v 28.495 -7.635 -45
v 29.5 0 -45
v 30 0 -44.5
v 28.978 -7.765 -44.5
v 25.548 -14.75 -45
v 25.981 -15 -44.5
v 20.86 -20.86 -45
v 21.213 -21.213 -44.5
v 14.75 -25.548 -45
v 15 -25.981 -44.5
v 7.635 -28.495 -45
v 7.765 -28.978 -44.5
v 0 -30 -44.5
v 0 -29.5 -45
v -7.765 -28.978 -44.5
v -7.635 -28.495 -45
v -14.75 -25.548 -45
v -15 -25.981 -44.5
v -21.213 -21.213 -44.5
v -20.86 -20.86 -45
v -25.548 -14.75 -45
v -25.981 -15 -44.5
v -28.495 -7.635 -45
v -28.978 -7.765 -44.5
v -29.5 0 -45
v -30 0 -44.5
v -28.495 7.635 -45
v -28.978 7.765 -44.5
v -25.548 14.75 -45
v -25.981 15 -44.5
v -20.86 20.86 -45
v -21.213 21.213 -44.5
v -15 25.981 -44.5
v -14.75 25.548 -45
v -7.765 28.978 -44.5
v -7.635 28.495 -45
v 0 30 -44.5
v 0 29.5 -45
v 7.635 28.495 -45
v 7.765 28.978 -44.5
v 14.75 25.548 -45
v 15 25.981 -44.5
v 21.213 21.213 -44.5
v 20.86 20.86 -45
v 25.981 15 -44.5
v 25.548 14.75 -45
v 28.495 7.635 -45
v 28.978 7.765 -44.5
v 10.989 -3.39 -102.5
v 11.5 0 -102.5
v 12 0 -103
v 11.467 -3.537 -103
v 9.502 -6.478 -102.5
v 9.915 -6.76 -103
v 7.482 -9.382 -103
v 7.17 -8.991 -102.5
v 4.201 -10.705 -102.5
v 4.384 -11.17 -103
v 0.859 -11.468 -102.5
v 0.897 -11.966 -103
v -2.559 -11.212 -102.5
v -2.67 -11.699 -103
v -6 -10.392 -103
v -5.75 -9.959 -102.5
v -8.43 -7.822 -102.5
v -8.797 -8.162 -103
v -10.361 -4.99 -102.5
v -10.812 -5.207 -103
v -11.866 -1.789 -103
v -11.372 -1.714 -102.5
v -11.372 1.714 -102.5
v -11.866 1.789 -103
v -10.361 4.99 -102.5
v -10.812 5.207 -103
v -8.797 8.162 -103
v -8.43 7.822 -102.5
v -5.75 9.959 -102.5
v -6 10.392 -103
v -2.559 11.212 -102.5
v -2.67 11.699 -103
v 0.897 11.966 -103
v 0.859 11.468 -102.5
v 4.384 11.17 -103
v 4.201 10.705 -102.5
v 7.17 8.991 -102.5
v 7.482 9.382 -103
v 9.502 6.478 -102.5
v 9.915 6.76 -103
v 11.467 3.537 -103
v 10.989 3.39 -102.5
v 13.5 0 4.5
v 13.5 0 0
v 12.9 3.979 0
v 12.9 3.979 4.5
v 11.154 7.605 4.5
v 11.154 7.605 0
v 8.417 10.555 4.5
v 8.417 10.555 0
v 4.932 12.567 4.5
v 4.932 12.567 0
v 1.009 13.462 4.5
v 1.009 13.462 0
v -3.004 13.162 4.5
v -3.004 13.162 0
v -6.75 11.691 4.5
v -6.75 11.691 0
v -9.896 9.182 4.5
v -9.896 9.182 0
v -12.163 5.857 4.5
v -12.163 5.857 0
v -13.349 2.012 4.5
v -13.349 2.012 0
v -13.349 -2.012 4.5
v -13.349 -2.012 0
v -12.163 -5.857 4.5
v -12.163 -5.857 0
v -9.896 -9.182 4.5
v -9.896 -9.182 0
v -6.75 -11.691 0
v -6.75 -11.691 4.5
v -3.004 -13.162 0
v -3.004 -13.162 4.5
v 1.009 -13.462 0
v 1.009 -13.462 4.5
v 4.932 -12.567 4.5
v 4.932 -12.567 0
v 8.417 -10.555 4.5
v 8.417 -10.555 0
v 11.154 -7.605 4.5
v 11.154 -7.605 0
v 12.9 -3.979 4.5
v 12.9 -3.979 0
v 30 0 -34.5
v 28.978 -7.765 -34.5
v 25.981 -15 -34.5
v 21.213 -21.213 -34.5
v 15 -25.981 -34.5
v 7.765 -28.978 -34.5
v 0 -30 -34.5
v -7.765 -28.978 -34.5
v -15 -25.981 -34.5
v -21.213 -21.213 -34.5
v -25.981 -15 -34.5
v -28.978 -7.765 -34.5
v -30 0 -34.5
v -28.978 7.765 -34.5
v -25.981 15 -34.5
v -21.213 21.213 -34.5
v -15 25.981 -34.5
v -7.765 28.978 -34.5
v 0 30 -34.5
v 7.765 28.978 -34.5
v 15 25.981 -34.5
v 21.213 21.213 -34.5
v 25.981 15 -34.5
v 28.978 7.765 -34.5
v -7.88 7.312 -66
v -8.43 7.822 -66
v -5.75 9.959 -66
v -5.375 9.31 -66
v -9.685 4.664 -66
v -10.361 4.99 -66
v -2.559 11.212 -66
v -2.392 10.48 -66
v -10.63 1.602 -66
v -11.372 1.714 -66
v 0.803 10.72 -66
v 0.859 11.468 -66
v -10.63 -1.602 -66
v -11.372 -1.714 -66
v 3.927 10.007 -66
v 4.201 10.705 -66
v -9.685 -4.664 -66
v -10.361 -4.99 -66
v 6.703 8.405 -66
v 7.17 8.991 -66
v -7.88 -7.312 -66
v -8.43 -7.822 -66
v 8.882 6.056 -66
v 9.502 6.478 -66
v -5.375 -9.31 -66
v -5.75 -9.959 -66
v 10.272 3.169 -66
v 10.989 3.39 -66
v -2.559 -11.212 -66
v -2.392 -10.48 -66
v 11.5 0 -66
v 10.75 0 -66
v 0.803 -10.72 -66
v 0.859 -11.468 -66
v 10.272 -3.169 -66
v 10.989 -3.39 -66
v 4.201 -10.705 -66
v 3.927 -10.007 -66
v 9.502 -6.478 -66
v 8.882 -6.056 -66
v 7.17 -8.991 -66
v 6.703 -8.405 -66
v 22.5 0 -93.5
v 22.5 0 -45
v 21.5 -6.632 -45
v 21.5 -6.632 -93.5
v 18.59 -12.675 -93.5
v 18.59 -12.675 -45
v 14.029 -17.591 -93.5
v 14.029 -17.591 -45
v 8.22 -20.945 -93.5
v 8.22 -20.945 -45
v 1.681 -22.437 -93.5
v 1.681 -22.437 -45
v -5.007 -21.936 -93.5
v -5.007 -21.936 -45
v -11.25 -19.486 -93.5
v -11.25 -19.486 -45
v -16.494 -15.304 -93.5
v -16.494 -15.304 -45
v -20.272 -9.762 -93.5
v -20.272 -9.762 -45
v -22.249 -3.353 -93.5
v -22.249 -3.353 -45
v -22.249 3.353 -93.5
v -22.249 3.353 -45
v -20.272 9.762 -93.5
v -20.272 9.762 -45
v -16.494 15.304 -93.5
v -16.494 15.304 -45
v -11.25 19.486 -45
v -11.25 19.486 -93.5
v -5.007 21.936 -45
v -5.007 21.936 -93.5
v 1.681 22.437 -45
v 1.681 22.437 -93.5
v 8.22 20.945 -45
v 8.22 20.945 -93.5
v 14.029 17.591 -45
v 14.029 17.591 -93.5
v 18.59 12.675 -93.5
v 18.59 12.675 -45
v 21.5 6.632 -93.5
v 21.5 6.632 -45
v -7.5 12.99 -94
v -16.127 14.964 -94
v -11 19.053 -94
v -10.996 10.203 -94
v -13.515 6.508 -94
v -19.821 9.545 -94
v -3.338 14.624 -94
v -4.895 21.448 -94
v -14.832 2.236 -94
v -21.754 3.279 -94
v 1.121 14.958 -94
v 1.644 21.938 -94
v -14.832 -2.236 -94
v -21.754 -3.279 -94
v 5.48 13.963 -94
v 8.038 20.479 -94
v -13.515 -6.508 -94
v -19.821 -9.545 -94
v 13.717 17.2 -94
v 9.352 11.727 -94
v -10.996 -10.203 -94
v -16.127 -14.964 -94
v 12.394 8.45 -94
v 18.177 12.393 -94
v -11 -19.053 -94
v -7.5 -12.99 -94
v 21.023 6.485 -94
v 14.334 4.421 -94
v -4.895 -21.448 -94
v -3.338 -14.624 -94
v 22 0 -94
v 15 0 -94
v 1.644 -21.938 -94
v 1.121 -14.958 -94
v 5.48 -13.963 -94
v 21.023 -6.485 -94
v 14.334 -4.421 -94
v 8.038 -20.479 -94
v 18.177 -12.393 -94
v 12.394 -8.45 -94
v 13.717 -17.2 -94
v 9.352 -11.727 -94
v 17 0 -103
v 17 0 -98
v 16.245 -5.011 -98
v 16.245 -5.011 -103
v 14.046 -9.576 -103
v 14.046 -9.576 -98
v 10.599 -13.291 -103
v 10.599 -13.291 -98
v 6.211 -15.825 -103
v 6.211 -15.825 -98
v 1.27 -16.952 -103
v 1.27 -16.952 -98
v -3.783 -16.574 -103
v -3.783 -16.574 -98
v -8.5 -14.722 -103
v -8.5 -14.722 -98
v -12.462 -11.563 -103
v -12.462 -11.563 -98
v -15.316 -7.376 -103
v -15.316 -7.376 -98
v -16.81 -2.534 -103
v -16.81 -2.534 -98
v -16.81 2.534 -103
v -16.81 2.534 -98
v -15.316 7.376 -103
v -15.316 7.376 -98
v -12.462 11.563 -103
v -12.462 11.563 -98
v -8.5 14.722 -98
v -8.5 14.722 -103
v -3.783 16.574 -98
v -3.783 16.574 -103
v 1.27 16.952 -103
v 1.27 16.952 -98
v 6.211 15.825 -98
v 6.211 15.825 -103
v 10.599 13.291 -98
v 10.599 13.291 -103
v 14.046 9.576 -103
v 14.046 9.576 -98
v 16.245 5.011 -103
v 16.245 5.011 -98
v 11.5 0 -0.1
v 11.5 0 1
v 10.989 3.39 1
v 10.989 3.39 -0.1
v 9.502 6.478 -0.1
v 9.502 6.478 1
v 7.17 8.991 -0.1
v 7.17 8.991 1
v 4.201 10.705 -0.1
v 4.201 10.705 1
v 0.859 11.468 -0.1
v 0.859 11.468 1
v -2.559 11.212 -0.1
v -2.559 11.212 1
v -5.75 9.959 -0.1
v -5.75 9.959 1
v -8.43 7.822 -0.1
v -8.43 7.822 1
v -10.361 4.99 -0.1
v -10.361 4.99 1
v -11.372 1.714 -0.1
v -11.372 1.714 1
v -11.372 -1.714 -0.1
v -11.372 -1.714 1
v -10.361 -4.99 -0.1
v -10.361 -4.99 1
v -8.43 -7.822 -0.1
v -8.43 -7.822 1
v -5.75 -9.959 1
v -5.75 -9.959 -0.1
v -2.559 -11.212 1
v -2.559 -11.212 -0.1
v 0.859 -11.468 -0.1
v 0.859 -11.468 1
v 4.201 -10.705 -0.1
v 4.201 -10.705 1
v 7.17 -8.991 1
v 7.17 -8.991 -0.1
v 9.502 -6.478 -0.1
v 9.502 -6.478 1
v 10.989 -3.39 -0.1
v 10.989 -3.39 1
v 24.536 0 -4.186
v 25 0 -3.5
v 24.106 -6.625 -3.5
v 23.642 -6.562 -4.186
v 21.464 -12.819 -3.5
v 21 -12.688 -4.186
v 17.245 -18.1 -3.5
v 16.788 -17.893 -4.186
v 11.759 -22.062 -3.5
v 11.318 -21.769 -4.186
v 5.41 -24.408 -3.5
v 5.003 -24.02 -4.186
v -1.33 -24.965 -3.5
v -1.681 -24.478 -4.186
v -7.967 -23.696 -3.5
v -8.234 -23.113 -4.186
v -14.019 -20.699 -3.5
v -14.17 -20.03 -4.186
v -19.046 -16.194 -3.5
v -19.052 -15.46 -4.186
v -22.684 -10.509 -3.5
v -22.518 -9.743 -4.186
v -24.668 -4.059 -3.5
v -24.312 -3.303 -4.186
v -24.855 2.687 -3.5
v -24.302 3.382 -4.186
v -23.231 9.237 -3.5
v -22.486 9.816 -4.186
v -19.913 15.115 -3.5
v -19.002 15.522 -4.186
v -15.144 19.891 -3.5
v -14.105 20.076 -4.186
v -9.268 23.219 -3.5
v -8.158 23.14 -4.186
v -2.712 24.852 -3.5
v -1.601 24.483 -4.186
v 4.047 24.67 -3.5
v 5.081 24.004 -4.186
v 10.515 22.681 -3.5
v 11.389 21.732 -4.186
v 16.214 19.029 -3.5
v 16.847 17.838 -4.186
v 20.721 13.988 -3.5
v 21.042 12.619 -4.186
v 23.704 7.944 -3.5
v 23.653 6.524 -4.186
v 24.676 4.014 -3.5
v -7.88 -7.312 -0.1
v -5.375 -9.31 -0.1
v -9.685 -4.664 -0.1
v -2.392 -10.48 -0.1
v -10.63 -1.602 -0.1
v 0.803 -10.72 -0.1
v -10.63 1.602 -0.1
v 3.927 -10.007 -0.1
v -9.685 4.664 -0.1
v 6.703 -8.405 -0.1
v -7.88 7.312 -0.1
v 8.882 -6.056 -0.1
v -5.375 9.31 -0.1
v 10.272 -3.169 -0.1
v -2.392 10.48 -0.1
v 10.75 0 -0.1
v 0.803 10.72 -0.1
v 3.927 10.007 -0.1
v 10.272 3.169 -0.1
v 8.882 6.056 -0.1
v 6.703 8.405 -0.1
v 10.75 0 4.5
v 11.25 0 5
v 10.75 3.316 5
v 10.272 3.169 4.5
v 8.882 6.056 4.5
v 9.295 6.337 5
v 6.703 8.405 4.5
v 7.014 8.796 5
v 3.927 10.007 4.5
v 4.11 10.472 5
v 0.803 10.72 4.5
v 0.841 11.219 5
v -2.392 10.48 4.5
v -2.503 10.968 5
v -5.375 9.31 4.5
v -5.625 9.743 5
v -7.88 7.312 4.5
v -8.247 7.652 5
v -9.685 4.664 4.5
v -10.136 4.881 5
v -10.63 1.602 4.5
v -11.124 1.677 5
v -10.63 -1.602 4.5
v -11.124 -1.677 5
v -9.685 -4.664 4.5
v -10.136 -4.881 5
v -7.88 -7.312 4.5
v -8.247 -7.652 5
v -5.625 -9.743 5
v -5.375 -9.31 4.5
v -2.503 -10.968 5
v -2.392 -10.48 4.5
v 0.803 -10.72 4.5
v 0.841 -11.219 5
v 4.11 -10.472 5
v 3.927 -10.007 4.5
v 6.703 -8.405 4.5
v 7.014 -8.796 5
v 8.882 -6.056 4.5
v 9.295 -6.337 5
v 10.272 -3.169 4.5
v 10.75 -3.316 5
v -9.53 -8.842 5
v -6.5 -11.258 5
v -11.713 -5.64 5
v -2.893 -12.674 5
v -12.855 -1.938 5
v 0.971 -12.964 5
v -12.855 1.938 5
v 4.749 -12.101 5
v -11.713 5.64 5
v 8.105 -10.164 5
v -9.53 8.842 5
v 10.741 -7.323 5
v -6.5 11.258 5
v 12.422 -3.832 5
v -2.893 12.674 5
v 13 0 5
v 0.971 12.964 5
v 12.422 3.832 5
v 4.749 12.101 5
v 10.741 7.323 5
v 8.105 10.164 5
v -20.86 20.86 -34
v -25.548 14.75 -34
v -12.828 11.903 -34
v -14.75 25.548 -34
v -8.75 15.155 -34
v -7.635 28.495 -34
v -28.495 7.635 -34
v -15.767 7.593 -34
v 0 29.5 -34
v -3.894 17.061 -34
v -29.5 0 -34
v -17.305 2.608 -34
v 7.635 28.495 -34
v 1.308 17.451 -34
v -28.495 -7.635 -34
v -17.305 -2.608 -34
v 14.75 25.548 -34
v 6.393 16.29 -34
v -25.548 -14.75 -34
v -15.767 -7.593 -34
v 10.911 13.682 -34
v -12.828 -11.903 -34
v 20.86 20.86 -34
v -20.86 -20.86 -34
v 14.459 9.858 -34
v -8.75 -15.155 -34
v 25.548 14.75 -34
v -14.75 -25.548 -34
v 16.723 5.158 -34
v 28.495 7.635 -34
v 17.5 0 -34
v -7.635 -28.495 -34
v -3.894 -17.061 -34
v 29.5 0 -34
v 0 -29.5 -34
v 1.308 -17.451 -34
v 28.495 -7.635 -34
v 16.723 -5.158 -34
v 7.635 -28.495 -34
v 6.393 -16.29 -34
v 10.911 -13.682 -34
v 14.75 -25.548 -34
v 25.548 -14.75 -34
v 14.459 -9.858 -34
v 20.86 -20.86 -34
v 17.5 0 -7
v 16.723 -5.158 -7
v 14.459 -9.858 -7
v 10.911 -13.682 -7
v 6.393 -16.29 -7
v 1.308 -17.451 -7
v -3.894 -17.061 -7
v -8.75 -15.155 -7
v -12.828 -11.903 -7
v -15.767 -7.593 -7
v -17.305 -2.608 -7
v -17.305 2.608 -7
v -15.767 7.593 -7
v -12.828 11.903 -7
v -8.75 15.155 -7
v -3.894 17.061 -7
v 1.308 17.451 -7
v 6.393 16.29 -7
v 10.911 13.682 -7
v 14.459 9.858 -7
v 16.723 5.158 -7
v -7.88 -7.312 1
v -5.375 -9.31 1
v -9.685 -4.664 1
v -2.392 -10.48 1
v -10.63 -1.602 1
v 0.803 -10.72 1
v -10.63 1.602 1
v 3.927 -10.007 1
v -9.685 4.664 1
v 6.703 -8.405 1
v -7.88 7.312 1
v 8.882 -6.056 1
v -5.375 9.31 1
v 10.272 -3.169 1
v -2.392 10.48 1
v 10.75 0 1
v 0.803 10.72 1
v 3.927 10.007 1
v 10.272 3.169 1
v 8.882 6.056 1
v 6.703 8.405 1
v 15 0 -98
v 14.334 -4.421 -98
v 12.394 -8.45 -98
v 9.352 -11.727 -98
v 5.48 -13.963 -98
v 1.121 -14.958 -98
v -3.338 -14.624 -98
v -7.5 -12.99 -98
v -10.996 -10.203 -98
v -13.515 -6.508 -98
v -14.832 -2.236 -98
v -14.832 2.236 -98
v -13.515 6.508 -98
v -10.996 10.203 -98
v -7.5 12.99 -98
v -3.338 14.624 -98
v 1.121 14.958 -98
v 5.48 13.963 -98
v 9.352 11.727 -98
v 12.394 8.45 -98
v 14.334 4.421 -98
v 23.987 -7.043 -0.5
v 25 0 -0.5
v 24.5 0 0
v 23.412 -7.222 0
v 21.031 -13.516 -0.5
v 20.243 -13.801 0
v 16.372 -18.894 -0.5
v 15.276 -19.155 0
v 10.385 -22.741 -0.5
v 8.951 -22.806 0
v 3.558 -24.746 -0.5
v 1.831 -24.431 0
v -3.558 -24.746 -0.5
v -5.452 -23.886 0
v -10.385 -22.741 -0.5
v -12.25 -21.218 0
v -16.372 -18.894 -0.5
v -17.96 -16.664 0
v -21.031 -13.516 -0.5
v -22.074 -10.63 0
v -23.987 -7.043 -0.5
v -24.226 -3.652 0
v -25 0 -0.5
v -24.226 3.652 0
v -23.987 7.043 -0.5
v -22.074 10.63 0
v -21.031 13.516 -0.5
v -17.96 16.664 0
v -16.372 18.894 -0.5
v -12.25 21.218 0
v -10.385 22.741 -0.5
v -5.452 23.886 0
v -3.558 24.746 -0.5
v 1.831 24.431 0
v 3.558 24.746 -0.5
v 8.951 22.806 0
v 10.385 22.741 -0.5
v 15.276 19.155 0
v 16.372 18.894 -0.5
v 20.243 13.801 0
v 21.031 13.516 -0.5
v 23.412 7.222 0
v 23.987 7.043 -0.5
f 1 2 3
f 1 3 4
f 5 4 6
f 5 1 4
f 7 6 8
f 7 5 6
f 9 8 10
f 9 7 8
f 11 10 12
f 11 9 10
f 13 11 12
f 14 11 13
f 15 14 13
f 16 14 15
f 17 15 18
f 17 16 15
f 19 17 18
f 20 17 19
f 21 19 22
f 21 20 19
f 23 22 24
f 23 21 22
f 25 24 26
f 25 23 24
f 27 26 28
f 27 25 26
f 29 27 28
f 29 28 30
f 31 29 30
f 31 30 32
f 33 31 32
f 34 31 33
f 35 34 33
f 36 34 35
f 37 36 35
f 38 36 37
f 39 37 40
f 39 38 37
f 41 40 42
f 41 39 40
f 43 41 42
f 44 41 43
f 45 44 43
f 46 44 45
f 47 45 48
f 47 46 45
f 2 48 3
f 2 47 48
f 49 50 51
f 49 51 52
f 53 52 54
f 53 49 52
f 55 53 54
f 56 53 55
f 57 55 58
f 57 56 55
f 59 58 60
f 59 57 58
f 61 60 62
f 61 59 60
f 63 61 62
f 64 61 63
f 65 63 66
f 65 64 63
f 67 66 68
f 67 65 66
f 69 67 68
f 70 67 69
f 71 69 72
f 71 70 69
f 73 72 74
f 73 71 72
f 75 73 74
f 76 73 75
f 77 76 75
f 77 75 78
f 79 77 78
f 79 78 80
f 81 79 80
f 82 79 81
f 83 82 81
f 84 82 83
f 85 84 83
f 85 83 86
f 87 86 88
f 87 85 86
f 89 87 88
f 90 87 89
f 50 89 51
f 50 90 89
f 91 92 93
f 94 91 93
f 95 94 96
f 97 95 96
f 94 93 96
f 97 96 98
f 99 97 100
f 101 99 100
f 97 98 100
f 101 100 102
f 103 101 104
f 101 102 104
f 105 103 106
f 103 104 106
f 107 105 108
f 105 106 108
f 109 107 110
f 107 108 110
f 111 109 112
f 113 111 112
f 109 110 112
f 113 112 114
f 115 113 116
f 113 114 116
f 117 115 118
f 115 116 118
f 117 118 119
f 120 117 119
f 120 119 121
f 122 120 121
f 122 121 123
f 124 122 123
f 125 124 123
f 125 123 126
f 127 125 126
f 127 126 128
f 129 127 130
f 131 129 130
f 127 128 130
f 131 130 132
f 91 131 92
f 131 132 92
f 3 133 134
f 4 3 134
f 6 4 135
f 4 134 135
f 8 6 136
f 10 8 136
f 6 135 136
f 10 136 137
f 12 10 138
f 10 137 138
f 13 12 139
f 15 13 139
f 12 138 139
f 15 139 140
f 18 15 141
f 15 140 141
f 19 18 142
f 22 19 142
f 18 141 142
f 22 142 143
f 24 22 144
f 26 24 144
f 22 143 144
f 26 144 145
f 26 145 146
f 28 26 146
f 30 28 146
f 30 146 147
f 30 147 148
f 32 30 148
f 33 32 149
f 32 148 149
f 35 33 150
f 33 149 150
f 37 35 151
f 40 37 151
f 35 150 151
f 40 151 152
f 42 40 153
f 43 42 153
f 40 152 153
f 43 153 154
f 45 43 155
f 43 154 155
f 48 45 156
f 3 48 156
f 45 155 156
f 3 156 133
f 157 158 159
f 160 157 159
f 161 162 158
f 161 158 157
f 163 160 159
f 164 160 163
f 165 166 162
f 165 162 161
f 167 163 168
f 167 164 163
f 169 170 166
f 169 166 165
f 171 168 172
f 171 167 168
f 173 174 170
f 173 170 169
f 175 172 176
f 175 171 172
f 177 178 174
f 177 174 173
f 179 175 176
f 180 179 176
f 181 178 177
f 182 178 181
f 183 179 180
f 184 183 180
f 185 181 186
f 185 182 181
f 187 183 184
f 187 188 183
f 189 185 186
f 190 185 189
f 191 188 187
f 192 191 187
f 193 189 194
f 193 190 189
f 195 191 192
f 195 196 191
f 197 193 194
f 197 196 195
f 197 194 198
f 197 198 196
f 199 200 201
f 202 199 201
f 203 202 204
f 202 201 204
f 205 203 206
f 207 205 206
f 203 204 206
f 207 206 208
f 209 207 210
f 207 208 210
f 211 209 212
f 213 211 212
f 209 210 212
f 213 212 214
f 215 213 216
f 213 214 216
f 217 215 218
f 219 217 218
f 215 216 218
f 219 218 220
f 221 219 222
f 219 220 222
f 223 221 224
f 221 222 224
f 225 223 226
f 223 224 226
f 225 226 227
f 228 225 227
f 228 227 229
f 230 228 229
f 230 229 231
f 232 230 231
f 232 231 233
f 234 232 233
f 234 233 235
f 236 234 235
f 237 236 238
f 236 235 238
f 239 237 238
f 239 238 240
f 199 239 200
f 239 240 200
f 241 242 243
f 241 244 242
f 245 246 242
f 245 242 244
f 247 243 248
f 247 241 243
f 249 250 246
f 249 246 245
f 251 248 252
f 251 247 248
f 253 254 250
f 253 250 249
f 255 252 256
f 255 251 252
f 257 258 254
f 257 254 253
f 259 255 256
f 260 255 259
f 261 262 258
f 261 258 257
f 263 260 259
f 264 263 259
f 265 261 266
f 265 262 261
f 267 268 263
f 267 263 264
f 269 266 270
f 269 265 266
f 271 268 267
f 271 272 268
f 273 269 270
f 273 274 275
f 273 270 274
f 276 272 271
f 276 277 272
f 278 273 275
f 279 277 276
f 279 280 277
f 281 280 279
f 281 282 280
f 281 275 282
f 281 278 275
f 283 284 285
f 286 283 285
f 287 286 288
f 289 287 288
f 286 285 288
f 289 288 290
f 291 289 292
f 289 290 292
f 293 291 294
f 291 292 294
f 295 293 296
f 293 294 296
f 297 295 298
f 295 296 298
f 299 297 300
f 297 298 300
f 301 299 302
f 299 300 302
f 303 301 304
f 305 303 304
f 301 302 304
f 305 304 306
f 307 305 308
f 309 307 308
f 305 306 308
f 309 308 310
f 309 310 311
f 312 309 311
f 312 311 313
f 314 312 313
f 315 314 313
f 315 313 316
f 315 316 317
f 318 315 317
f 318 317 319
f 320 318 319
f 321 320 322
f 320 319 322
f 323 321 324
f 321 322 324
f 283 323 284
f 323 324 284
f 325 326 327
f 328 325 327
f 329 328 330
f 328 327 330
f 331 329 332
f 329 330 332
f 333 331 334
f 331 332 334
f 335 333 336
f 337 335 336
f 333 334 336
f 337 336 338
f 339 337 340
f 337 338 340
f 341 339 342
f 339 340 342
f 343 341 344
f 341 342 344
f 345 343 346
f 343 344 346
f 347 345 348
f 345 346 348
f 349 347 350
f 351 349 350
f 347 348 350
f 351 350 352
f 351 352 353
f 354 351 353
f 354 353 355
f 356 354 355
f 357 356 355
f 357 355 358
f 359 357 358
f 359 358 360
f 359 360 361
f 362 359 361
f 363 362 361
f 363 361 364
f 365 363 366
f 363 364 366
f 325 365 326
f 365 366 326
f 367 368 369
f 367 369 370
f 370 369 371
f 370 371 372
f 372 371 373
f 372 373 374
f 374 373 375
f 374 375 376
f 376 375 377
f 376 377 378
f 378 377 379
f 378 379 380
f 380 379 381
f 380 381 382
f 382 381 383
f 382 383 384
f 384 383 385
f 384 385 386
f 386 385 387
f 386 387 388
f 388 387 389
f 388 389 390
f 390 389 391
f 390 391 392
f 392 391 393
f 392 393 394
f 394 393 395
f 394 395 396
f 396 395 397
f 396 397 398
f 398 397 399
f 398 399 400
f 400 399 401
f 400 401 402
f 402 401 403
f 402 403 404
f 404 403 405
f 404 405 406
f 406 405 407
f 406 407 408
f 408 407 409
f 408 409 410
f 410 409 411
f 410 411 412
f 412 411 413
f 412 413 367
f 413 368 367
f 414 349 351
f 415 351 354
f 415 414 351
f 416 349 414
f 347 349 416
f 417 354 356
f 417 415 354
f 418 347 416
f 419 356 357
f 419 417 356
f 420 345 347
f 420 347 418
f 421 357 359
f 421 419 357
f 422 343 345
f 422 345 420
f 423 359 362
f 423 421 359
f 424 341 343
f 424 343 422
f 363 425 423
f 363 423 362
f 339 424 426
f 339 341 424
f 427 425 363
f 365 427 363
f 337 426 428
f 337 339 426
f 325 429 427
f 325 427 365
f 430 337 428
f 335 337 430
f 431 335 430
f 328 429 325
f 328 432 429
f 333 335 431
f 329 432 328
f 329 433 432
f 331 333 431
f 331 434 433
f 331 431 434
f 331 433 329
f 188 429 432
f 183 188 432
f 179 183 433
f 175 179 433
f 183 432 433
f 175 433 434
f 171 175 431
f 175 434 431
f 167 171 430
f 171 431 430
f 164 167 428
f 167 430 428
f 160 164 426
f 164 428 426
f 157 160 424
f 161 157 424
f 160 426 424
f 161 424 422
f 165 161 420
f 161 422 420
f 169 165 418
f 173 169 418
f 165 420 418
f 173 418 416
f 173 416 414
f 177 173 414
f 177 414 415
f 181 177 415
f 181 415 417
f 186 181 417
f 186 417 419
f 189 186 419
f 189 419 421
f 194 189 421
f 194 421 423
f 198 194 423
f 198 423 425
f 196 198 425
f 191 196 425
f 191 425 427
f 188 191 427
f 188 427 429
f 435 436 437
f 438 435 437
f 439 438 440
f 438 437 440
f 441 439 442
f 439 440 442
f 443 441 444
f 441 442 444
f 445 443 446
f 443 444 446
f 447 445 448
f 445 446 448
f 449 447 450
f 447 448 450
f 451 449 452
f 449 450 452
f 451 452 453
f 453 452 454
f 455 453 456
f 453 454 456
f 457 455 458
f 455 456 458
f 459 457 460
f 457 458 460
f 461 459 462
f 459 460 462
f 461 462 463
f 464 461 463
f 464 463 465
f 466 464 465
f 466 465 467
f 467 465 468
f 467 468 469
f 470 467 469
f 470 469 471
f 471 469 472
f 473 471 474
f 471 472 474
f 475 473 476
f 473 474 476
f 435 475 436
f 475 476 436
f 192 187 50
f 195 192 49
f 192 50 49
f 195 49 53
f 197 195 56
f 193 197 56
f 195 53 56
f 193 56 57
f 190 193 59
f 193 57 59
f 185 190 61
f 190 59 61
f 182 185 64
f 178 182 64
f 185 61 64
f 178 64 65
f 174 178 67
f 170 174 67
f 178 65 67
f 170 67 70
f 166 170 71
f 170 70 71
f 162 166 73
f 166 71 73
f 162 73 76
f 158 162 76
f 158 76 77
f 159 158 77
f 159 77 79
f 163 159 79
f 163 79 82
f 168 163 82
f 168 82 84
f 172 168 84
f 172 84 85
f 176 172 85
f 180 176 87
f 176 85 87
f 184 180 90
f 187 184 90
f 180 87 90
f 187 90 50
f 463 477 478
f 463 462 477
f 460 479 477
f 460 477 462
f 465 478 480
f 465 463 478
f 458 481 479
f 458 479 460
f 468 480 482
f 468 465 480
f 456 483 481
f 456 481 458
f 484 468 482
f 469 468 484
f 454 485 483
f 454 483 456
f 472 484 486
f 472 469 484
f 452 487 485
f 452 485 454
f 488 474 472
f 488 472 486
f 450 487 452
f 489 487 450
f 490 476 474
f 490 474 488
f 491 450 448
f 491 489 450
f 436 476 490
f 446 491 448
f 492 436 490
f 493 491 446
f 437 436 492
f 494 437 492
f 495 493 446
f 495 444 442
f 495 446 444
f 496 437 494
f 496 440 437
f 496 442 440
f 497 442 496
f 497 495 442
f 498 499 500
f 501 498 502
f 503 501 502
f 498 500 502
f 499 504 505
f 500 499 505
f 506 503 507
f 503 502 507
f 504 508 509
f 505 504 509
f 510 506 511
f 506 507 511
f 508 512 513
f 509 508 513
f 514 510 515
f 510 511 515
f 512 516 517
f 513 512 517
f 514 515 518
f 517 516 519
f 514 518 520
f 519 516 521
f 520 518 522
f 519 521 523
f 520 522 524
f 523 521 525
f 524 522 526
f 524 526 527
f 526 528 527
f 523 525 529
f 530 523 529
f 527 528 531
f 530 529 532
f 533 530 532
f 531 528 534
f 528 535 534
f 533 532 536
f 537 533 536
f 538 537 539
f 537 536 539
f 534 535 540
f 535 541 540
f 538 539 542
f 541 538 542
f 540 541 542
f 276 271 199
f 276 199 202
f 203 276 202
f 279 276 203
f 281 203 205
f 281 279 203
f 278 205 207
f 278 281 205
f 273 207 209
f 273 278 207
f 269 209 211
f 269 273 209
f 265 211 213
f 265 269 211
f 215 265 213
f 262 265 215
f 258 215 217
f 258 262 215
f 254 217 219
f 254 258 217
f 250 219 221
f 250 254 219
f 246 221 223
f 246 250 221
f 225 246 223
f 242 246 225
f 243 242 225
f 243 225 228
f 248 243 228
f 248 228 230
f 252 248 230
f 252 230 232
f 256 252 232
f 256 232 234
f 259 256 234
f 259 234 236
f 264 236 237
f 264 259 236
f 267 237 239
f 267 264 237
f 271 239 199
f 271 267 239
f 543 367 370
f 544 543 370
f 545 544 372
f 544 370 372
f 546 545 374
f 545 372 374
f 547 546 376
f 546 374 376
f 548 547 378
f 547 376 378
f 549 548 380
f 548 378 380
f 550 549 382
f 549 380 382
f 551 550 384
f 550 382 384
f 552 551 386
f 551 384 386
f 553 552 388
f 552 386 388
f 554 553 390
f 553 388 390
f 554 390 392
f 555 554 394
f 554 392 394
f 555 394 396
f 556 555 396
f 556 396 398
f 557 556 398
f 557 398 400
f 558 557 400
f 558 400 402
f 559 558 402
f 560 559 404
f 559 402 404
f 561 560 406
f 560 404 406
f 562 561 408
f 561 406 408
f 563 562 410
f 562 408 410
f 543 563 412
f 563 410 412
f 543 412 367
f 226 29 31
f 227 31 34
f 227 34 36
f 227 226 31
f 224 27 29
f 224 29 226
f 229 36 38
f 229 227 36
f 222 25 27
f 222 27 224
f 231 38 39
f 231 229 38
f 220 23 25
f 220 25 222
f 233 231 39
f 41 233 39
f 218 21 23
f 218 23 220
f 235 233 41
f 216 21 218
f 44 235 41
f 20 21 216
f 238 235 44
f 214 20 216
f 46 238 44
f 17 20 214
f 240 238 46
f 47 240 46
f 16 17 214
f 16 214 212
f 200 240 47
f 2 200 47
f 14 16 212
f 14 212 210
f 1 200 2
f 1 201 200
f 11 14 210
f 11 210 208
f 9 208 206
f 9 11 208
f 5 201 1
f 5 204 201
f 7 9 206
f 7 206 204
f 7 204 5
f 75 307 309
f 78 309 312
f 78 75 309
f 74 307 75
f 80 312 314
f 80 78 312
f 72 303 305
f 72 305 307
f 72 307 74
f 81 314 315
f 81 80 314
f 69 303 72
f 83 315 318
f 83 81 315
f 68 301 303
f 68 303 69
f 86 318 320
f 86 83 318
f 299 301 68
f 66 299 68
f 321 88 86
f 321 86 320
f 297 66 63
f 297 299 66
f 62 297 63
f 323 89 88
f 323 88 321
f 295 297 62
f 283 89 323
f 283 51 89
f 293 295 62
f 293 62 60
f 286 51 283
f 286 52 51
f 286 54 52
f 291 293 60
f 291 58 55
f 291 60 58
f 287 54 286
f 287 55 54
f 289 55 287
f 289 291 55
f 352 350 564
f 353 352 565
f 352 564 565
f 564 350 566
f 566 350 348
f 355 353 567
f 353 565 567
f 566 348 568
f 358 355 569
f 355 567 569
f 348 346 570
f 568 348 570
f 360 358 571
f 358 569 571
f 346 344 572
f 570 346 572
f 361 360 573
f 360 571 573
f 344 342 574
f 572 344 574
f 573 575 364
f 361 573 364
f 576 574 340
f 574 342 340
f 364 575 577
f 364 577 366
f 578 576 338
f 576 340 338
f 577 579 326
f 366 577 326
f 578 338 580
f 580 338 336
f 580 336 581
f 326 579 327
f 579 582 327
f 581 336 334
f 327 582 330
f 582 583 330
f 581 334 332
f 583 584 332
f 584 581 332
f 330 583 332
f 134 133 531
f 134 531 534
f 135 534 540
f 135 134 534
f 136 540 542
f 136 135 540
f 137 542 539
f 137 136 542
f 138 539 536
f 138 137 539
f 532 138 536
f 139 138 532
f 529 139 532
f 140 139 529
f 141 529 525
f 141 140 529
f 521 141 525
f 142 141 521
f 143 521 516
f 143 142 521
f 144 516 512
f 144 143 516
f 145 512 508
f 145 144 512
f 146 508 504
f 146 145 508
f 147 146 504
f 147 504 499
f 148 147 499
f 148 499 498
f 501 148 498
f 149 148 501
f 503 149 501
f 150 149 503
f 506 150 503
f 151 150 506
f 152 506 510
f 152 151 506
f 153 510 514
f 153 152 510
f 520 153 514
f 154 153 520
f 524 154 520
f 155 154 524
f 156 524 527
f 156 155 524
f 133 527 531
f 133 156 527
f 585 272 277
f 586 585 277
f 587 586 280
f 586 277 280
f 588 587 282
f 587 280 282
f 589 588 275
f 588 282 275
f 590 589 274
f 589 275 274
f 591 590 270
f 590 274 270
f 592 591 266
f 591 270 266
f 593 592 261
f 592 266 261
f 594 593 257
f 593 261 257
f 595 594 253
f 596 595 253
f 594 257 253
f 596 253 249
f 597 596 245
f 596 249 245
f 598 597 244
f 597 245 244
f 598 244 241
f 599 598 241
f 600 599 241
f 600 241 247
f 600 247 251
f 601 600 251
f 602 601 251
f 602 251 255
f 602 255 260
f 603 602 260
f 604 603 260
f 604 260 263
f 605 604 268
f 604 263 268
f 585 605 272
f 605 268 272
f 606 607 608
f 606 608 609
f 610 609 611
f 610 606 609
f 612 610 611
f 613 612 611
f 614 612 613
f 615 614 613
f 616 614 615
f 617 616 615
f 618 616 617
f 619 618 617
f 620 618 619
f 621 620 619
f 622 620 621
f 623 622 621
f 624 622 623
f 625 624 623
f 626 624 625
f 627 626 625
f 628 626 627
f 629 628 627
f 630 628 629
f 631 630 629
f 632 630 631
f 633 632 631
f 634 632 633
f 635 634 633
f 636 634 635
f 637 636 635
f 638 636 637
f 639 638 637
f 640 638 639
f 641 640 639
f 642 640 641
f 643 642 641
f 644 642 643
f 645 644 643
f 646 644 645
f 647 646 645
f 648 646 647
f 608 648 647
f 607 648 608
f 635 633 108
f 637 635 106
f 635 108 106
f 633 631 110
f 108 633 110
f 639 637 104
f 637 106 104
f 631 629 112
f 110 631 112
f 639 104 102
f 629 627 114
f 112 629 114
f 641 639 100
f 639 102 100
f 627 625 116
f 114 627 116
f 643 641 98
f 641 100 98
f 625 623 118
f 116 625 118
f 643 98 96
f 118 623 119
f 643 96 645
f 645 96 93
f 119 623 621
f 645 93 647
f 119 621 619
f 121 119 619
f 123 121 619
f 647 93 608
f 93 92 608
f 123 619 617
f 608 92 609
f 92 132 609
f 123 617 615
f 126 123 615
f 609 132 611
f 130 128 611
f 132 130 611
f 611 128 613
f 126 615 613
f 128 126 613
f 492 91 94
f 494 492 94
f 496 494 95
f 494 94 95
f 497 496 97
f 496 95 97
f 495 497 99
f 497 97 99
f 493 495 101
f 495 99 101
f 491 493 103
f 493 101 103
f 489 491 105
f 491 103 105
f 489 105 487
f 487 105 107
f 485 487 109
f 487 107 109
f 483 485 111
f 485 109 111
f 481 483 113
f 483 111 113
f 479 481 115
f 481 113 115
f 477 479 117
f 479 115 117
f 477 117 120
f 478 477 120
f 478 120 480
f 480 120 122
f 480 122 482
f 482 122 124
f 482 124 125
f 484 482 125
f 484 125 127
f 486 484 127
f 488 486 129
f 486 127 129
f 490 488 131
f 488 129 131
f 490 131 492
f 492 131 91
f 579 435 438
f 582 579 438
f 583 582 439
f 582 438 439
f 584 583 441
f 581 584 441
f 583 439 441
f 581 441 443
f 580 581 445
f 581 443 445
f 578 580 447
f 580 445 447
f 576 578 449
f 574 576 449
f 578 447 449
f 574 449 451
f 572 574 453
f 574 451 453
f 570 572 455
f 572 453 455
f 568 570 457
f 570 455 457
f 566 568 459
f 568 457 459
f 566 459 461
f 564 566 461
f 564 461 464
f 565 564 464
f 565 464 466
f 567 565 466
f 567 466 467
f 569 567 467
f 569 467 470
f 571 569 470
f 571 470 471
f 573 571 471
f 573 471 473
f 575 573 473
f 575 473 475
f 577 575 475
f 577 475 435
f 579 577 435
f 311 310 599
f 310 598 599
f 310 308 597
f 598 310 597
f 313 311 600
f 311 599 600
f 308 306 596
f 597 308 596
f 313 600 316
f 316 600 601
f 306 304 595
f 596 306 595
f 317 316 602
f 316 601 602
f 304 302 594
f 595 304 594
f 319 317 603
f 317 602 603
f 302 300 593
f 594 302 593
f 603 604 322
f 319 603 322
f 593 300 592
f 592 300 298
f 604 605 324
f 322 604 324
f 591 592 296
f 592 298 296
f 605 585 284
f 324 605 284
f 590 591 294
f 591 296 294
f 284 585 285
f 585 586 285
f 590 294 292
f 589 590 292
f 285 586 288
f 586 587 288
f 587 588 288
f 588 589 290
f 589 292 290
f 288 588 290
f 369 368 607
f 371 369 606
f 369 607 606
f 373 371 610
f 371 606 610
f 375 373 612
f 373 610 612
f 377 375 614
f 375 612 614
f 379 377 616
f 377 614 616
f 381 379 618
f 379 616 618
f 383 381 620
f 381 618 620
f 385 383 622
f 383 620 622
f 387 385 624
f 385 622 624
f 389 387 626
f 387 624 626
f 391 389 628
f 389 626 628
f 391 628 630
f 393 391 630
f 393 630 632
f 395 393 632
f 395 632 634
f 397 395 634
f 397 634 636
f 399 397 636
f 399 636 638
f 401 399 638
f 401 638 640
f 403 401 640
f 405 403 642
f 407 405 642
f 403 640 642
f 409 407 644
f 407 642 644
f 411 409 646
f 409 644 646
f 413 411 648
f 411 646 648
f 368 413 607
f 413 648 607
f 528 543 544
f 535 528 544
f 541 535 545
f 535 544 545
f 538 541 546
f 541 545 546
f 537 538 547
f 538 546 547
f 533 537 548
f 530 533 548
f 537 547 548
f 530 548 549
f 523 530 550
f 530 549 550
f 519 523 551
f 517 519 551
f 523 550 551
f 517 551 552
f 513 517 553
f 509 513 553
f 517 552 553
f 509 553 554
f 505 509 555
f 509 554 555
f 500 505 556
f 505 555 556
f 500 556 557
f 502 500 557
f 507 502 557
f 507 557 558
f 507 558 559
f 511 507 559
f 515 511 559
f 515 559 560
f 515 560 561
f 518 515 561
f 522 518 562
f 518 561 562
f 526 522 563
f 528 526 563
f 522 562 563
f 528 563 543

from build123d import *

# Parameters (mm, degrees)
F0_R      = 13.5
F0_R_2    = 10.75
F1_DEPTH  = 5
F2_R      = 25
F2_R_2    = 13.5
F2_R_3    = 10.75
F3_DEPTH  = 7
F4_R      = 17.5
F5_DEPTH  = 27
F6_R      = 30
F6_R_2    = 17.5
F7_DEPTH  = 11
F8_R      = 22.5
F9_DEPTH  = 49
F10_R     = 15
F11_DEPTH = 4
F12_R     = 17
F12_R_2   = 15
F13_DEPTH = 5
F14_R     = 11.5
F15_DEPTH = 37
F16_R     = 10.75
F17_DEPTH = 103.001
F18_SIZE  = 0.5
F19_SIZE2 = 2.99999
F19_SIZE  = 7.49999
F20_SIZE  = 0.5
F22_R     = 11.5
F23_DEPTH = 1.1


# Not quite as in the source:
# - a fillet or chamfer is up to 0.001 mm smaller than in the source, because OpenCascade refuses the exact size


with BuildPart() as f1:
    # F0 (on Top) → F1 (new body)
    with BuildSketch(Plane.XY):
        Circle(F0_R)
        Circle(F0_R_2, mode=Mode.SUBTRACT)
    extrude(amount=F1_DEPTH)

    # F2 (on face) → F3 (join)
    with BuildSketch(Plane(origin=(0, 0, 0), x_dir=(1, 0, 0), z_dir=(0, 0, -1))):
        Circle(F2_R)
        Circle(F2_R_2, mode=Mode.SUBTRACT)
        Circle(F2_R_2)
        Circle(F2_R_3, mode=Mode.SUBTRACT)
    extrude(amount=F3_DEPTH)

    # F4 (on face) → F5 (join)
    with BuildSketch(Plane(origin=(0, 0, -7), x_dir=(1, 0, 0), z_dir=(0, 0, -1))):
        Circle(F4_R)
    extrude(amount=F5_DEPTH)

    # F6 (on face) → F7 (join)
    with BuildSketch(Plane(origin=(0, 0, -34), x_dir=(1, 0, 0), z_dir=(0, 0, -1))):
        Circle(F6_R)
        Circle(F6_R_2, mode=Mode.SUBTRACT)
        Circle(F6_R_2)
    extrude(amount=F7_DEPTH)

    # F8 (on face) → F9 (join)
    with BuildSketch(Plane(origin=(0, 0, -45), x_dir=(1, 0, 0), z_dir=(0, 0, -1))):
        Circle(F8_R)
    extrude(amount=F9_DEPTH)

    # F10 (on face) → F11 (join)
    with BuildSketch(Plane(origin=(0, 0, -94), x_dir=(1, 0, 0), z_dir=(0, 0, -1))):
        Circle(F10_R)
    extrude(amount=F11_DEPTH)

    # F12 (on face) → F13 (join)
    with BuildSketch(Plane(origin=(0, 0, -98), x_dir=(1, 0, 0), z_dir=(0, 0, -1))):
        Circle(F12_R)
        Circle(F12_R_2, mode=Mode.SUBTRACT)
        Circle(F12_R_2)
    extrude(amount=F13_DEPTH)

    # F14 (on face) → F15 (cut)
    with BuildSketch(Plane(origin=(0, 0, -103), x_dir=(1, 0, 0), z_dir=(0, 0, -1))):
        Circle(F14_R)
    extrude(amount=-F15_DEPTH, mode=Mode.SUBTRACT)

    # F16 (on face) → F17 (cut, through all)
    with BuildSketch(Plane.XY):
        Circle(F16_R)
    extrude(amount=-F17_DEPTH, mode=Mode.SUBTRACT)

    # F18
    f18_edges = [f1.edges().sort_by_distance(p)[0] for p in [
        (-11.5, 0, -103),
        (-22.5, 0, -94),
        (-30, 0, -45),
        (-30, 0, -34),
        (-25, 0, 0),
        (-13.5, 0, 5),
        (-10.75, 0, 5),
    ]]
    chamfer(f18_edges, length=F18_SIZE)

    # F19 (size 7.5 and 3 in the source; OpenCascade refuses exactly that, so slightly less here)
    f19_edges = [f1.edges().sort_by_distance(p)[0] for p in [
        (-25, 0, -7),
    ]]
    f19_side = f1.faces().sort_by_distance((-24.292893, 0, -7))[0]
    chamfer(f19_edges, length=F19_SIZE, length2=F19_SIZE2, reference=f19_side)

    # F20
    f20_edges = [f1.edges().sort_by_distance(p)[0] for p in [
        (-25, 0, -4.00001),
    ]]
    chamfer(f20_edges, length=F20_SIZE)

    # F22 (on offset) → F23 (cut)
    with BuildSketch(Plane.XY.offset(1)):
        Circle(F22_R)
    extrude(amount=-F23_DEPTH, mode=Mode.SUBTRACT)


solid = f1.part
